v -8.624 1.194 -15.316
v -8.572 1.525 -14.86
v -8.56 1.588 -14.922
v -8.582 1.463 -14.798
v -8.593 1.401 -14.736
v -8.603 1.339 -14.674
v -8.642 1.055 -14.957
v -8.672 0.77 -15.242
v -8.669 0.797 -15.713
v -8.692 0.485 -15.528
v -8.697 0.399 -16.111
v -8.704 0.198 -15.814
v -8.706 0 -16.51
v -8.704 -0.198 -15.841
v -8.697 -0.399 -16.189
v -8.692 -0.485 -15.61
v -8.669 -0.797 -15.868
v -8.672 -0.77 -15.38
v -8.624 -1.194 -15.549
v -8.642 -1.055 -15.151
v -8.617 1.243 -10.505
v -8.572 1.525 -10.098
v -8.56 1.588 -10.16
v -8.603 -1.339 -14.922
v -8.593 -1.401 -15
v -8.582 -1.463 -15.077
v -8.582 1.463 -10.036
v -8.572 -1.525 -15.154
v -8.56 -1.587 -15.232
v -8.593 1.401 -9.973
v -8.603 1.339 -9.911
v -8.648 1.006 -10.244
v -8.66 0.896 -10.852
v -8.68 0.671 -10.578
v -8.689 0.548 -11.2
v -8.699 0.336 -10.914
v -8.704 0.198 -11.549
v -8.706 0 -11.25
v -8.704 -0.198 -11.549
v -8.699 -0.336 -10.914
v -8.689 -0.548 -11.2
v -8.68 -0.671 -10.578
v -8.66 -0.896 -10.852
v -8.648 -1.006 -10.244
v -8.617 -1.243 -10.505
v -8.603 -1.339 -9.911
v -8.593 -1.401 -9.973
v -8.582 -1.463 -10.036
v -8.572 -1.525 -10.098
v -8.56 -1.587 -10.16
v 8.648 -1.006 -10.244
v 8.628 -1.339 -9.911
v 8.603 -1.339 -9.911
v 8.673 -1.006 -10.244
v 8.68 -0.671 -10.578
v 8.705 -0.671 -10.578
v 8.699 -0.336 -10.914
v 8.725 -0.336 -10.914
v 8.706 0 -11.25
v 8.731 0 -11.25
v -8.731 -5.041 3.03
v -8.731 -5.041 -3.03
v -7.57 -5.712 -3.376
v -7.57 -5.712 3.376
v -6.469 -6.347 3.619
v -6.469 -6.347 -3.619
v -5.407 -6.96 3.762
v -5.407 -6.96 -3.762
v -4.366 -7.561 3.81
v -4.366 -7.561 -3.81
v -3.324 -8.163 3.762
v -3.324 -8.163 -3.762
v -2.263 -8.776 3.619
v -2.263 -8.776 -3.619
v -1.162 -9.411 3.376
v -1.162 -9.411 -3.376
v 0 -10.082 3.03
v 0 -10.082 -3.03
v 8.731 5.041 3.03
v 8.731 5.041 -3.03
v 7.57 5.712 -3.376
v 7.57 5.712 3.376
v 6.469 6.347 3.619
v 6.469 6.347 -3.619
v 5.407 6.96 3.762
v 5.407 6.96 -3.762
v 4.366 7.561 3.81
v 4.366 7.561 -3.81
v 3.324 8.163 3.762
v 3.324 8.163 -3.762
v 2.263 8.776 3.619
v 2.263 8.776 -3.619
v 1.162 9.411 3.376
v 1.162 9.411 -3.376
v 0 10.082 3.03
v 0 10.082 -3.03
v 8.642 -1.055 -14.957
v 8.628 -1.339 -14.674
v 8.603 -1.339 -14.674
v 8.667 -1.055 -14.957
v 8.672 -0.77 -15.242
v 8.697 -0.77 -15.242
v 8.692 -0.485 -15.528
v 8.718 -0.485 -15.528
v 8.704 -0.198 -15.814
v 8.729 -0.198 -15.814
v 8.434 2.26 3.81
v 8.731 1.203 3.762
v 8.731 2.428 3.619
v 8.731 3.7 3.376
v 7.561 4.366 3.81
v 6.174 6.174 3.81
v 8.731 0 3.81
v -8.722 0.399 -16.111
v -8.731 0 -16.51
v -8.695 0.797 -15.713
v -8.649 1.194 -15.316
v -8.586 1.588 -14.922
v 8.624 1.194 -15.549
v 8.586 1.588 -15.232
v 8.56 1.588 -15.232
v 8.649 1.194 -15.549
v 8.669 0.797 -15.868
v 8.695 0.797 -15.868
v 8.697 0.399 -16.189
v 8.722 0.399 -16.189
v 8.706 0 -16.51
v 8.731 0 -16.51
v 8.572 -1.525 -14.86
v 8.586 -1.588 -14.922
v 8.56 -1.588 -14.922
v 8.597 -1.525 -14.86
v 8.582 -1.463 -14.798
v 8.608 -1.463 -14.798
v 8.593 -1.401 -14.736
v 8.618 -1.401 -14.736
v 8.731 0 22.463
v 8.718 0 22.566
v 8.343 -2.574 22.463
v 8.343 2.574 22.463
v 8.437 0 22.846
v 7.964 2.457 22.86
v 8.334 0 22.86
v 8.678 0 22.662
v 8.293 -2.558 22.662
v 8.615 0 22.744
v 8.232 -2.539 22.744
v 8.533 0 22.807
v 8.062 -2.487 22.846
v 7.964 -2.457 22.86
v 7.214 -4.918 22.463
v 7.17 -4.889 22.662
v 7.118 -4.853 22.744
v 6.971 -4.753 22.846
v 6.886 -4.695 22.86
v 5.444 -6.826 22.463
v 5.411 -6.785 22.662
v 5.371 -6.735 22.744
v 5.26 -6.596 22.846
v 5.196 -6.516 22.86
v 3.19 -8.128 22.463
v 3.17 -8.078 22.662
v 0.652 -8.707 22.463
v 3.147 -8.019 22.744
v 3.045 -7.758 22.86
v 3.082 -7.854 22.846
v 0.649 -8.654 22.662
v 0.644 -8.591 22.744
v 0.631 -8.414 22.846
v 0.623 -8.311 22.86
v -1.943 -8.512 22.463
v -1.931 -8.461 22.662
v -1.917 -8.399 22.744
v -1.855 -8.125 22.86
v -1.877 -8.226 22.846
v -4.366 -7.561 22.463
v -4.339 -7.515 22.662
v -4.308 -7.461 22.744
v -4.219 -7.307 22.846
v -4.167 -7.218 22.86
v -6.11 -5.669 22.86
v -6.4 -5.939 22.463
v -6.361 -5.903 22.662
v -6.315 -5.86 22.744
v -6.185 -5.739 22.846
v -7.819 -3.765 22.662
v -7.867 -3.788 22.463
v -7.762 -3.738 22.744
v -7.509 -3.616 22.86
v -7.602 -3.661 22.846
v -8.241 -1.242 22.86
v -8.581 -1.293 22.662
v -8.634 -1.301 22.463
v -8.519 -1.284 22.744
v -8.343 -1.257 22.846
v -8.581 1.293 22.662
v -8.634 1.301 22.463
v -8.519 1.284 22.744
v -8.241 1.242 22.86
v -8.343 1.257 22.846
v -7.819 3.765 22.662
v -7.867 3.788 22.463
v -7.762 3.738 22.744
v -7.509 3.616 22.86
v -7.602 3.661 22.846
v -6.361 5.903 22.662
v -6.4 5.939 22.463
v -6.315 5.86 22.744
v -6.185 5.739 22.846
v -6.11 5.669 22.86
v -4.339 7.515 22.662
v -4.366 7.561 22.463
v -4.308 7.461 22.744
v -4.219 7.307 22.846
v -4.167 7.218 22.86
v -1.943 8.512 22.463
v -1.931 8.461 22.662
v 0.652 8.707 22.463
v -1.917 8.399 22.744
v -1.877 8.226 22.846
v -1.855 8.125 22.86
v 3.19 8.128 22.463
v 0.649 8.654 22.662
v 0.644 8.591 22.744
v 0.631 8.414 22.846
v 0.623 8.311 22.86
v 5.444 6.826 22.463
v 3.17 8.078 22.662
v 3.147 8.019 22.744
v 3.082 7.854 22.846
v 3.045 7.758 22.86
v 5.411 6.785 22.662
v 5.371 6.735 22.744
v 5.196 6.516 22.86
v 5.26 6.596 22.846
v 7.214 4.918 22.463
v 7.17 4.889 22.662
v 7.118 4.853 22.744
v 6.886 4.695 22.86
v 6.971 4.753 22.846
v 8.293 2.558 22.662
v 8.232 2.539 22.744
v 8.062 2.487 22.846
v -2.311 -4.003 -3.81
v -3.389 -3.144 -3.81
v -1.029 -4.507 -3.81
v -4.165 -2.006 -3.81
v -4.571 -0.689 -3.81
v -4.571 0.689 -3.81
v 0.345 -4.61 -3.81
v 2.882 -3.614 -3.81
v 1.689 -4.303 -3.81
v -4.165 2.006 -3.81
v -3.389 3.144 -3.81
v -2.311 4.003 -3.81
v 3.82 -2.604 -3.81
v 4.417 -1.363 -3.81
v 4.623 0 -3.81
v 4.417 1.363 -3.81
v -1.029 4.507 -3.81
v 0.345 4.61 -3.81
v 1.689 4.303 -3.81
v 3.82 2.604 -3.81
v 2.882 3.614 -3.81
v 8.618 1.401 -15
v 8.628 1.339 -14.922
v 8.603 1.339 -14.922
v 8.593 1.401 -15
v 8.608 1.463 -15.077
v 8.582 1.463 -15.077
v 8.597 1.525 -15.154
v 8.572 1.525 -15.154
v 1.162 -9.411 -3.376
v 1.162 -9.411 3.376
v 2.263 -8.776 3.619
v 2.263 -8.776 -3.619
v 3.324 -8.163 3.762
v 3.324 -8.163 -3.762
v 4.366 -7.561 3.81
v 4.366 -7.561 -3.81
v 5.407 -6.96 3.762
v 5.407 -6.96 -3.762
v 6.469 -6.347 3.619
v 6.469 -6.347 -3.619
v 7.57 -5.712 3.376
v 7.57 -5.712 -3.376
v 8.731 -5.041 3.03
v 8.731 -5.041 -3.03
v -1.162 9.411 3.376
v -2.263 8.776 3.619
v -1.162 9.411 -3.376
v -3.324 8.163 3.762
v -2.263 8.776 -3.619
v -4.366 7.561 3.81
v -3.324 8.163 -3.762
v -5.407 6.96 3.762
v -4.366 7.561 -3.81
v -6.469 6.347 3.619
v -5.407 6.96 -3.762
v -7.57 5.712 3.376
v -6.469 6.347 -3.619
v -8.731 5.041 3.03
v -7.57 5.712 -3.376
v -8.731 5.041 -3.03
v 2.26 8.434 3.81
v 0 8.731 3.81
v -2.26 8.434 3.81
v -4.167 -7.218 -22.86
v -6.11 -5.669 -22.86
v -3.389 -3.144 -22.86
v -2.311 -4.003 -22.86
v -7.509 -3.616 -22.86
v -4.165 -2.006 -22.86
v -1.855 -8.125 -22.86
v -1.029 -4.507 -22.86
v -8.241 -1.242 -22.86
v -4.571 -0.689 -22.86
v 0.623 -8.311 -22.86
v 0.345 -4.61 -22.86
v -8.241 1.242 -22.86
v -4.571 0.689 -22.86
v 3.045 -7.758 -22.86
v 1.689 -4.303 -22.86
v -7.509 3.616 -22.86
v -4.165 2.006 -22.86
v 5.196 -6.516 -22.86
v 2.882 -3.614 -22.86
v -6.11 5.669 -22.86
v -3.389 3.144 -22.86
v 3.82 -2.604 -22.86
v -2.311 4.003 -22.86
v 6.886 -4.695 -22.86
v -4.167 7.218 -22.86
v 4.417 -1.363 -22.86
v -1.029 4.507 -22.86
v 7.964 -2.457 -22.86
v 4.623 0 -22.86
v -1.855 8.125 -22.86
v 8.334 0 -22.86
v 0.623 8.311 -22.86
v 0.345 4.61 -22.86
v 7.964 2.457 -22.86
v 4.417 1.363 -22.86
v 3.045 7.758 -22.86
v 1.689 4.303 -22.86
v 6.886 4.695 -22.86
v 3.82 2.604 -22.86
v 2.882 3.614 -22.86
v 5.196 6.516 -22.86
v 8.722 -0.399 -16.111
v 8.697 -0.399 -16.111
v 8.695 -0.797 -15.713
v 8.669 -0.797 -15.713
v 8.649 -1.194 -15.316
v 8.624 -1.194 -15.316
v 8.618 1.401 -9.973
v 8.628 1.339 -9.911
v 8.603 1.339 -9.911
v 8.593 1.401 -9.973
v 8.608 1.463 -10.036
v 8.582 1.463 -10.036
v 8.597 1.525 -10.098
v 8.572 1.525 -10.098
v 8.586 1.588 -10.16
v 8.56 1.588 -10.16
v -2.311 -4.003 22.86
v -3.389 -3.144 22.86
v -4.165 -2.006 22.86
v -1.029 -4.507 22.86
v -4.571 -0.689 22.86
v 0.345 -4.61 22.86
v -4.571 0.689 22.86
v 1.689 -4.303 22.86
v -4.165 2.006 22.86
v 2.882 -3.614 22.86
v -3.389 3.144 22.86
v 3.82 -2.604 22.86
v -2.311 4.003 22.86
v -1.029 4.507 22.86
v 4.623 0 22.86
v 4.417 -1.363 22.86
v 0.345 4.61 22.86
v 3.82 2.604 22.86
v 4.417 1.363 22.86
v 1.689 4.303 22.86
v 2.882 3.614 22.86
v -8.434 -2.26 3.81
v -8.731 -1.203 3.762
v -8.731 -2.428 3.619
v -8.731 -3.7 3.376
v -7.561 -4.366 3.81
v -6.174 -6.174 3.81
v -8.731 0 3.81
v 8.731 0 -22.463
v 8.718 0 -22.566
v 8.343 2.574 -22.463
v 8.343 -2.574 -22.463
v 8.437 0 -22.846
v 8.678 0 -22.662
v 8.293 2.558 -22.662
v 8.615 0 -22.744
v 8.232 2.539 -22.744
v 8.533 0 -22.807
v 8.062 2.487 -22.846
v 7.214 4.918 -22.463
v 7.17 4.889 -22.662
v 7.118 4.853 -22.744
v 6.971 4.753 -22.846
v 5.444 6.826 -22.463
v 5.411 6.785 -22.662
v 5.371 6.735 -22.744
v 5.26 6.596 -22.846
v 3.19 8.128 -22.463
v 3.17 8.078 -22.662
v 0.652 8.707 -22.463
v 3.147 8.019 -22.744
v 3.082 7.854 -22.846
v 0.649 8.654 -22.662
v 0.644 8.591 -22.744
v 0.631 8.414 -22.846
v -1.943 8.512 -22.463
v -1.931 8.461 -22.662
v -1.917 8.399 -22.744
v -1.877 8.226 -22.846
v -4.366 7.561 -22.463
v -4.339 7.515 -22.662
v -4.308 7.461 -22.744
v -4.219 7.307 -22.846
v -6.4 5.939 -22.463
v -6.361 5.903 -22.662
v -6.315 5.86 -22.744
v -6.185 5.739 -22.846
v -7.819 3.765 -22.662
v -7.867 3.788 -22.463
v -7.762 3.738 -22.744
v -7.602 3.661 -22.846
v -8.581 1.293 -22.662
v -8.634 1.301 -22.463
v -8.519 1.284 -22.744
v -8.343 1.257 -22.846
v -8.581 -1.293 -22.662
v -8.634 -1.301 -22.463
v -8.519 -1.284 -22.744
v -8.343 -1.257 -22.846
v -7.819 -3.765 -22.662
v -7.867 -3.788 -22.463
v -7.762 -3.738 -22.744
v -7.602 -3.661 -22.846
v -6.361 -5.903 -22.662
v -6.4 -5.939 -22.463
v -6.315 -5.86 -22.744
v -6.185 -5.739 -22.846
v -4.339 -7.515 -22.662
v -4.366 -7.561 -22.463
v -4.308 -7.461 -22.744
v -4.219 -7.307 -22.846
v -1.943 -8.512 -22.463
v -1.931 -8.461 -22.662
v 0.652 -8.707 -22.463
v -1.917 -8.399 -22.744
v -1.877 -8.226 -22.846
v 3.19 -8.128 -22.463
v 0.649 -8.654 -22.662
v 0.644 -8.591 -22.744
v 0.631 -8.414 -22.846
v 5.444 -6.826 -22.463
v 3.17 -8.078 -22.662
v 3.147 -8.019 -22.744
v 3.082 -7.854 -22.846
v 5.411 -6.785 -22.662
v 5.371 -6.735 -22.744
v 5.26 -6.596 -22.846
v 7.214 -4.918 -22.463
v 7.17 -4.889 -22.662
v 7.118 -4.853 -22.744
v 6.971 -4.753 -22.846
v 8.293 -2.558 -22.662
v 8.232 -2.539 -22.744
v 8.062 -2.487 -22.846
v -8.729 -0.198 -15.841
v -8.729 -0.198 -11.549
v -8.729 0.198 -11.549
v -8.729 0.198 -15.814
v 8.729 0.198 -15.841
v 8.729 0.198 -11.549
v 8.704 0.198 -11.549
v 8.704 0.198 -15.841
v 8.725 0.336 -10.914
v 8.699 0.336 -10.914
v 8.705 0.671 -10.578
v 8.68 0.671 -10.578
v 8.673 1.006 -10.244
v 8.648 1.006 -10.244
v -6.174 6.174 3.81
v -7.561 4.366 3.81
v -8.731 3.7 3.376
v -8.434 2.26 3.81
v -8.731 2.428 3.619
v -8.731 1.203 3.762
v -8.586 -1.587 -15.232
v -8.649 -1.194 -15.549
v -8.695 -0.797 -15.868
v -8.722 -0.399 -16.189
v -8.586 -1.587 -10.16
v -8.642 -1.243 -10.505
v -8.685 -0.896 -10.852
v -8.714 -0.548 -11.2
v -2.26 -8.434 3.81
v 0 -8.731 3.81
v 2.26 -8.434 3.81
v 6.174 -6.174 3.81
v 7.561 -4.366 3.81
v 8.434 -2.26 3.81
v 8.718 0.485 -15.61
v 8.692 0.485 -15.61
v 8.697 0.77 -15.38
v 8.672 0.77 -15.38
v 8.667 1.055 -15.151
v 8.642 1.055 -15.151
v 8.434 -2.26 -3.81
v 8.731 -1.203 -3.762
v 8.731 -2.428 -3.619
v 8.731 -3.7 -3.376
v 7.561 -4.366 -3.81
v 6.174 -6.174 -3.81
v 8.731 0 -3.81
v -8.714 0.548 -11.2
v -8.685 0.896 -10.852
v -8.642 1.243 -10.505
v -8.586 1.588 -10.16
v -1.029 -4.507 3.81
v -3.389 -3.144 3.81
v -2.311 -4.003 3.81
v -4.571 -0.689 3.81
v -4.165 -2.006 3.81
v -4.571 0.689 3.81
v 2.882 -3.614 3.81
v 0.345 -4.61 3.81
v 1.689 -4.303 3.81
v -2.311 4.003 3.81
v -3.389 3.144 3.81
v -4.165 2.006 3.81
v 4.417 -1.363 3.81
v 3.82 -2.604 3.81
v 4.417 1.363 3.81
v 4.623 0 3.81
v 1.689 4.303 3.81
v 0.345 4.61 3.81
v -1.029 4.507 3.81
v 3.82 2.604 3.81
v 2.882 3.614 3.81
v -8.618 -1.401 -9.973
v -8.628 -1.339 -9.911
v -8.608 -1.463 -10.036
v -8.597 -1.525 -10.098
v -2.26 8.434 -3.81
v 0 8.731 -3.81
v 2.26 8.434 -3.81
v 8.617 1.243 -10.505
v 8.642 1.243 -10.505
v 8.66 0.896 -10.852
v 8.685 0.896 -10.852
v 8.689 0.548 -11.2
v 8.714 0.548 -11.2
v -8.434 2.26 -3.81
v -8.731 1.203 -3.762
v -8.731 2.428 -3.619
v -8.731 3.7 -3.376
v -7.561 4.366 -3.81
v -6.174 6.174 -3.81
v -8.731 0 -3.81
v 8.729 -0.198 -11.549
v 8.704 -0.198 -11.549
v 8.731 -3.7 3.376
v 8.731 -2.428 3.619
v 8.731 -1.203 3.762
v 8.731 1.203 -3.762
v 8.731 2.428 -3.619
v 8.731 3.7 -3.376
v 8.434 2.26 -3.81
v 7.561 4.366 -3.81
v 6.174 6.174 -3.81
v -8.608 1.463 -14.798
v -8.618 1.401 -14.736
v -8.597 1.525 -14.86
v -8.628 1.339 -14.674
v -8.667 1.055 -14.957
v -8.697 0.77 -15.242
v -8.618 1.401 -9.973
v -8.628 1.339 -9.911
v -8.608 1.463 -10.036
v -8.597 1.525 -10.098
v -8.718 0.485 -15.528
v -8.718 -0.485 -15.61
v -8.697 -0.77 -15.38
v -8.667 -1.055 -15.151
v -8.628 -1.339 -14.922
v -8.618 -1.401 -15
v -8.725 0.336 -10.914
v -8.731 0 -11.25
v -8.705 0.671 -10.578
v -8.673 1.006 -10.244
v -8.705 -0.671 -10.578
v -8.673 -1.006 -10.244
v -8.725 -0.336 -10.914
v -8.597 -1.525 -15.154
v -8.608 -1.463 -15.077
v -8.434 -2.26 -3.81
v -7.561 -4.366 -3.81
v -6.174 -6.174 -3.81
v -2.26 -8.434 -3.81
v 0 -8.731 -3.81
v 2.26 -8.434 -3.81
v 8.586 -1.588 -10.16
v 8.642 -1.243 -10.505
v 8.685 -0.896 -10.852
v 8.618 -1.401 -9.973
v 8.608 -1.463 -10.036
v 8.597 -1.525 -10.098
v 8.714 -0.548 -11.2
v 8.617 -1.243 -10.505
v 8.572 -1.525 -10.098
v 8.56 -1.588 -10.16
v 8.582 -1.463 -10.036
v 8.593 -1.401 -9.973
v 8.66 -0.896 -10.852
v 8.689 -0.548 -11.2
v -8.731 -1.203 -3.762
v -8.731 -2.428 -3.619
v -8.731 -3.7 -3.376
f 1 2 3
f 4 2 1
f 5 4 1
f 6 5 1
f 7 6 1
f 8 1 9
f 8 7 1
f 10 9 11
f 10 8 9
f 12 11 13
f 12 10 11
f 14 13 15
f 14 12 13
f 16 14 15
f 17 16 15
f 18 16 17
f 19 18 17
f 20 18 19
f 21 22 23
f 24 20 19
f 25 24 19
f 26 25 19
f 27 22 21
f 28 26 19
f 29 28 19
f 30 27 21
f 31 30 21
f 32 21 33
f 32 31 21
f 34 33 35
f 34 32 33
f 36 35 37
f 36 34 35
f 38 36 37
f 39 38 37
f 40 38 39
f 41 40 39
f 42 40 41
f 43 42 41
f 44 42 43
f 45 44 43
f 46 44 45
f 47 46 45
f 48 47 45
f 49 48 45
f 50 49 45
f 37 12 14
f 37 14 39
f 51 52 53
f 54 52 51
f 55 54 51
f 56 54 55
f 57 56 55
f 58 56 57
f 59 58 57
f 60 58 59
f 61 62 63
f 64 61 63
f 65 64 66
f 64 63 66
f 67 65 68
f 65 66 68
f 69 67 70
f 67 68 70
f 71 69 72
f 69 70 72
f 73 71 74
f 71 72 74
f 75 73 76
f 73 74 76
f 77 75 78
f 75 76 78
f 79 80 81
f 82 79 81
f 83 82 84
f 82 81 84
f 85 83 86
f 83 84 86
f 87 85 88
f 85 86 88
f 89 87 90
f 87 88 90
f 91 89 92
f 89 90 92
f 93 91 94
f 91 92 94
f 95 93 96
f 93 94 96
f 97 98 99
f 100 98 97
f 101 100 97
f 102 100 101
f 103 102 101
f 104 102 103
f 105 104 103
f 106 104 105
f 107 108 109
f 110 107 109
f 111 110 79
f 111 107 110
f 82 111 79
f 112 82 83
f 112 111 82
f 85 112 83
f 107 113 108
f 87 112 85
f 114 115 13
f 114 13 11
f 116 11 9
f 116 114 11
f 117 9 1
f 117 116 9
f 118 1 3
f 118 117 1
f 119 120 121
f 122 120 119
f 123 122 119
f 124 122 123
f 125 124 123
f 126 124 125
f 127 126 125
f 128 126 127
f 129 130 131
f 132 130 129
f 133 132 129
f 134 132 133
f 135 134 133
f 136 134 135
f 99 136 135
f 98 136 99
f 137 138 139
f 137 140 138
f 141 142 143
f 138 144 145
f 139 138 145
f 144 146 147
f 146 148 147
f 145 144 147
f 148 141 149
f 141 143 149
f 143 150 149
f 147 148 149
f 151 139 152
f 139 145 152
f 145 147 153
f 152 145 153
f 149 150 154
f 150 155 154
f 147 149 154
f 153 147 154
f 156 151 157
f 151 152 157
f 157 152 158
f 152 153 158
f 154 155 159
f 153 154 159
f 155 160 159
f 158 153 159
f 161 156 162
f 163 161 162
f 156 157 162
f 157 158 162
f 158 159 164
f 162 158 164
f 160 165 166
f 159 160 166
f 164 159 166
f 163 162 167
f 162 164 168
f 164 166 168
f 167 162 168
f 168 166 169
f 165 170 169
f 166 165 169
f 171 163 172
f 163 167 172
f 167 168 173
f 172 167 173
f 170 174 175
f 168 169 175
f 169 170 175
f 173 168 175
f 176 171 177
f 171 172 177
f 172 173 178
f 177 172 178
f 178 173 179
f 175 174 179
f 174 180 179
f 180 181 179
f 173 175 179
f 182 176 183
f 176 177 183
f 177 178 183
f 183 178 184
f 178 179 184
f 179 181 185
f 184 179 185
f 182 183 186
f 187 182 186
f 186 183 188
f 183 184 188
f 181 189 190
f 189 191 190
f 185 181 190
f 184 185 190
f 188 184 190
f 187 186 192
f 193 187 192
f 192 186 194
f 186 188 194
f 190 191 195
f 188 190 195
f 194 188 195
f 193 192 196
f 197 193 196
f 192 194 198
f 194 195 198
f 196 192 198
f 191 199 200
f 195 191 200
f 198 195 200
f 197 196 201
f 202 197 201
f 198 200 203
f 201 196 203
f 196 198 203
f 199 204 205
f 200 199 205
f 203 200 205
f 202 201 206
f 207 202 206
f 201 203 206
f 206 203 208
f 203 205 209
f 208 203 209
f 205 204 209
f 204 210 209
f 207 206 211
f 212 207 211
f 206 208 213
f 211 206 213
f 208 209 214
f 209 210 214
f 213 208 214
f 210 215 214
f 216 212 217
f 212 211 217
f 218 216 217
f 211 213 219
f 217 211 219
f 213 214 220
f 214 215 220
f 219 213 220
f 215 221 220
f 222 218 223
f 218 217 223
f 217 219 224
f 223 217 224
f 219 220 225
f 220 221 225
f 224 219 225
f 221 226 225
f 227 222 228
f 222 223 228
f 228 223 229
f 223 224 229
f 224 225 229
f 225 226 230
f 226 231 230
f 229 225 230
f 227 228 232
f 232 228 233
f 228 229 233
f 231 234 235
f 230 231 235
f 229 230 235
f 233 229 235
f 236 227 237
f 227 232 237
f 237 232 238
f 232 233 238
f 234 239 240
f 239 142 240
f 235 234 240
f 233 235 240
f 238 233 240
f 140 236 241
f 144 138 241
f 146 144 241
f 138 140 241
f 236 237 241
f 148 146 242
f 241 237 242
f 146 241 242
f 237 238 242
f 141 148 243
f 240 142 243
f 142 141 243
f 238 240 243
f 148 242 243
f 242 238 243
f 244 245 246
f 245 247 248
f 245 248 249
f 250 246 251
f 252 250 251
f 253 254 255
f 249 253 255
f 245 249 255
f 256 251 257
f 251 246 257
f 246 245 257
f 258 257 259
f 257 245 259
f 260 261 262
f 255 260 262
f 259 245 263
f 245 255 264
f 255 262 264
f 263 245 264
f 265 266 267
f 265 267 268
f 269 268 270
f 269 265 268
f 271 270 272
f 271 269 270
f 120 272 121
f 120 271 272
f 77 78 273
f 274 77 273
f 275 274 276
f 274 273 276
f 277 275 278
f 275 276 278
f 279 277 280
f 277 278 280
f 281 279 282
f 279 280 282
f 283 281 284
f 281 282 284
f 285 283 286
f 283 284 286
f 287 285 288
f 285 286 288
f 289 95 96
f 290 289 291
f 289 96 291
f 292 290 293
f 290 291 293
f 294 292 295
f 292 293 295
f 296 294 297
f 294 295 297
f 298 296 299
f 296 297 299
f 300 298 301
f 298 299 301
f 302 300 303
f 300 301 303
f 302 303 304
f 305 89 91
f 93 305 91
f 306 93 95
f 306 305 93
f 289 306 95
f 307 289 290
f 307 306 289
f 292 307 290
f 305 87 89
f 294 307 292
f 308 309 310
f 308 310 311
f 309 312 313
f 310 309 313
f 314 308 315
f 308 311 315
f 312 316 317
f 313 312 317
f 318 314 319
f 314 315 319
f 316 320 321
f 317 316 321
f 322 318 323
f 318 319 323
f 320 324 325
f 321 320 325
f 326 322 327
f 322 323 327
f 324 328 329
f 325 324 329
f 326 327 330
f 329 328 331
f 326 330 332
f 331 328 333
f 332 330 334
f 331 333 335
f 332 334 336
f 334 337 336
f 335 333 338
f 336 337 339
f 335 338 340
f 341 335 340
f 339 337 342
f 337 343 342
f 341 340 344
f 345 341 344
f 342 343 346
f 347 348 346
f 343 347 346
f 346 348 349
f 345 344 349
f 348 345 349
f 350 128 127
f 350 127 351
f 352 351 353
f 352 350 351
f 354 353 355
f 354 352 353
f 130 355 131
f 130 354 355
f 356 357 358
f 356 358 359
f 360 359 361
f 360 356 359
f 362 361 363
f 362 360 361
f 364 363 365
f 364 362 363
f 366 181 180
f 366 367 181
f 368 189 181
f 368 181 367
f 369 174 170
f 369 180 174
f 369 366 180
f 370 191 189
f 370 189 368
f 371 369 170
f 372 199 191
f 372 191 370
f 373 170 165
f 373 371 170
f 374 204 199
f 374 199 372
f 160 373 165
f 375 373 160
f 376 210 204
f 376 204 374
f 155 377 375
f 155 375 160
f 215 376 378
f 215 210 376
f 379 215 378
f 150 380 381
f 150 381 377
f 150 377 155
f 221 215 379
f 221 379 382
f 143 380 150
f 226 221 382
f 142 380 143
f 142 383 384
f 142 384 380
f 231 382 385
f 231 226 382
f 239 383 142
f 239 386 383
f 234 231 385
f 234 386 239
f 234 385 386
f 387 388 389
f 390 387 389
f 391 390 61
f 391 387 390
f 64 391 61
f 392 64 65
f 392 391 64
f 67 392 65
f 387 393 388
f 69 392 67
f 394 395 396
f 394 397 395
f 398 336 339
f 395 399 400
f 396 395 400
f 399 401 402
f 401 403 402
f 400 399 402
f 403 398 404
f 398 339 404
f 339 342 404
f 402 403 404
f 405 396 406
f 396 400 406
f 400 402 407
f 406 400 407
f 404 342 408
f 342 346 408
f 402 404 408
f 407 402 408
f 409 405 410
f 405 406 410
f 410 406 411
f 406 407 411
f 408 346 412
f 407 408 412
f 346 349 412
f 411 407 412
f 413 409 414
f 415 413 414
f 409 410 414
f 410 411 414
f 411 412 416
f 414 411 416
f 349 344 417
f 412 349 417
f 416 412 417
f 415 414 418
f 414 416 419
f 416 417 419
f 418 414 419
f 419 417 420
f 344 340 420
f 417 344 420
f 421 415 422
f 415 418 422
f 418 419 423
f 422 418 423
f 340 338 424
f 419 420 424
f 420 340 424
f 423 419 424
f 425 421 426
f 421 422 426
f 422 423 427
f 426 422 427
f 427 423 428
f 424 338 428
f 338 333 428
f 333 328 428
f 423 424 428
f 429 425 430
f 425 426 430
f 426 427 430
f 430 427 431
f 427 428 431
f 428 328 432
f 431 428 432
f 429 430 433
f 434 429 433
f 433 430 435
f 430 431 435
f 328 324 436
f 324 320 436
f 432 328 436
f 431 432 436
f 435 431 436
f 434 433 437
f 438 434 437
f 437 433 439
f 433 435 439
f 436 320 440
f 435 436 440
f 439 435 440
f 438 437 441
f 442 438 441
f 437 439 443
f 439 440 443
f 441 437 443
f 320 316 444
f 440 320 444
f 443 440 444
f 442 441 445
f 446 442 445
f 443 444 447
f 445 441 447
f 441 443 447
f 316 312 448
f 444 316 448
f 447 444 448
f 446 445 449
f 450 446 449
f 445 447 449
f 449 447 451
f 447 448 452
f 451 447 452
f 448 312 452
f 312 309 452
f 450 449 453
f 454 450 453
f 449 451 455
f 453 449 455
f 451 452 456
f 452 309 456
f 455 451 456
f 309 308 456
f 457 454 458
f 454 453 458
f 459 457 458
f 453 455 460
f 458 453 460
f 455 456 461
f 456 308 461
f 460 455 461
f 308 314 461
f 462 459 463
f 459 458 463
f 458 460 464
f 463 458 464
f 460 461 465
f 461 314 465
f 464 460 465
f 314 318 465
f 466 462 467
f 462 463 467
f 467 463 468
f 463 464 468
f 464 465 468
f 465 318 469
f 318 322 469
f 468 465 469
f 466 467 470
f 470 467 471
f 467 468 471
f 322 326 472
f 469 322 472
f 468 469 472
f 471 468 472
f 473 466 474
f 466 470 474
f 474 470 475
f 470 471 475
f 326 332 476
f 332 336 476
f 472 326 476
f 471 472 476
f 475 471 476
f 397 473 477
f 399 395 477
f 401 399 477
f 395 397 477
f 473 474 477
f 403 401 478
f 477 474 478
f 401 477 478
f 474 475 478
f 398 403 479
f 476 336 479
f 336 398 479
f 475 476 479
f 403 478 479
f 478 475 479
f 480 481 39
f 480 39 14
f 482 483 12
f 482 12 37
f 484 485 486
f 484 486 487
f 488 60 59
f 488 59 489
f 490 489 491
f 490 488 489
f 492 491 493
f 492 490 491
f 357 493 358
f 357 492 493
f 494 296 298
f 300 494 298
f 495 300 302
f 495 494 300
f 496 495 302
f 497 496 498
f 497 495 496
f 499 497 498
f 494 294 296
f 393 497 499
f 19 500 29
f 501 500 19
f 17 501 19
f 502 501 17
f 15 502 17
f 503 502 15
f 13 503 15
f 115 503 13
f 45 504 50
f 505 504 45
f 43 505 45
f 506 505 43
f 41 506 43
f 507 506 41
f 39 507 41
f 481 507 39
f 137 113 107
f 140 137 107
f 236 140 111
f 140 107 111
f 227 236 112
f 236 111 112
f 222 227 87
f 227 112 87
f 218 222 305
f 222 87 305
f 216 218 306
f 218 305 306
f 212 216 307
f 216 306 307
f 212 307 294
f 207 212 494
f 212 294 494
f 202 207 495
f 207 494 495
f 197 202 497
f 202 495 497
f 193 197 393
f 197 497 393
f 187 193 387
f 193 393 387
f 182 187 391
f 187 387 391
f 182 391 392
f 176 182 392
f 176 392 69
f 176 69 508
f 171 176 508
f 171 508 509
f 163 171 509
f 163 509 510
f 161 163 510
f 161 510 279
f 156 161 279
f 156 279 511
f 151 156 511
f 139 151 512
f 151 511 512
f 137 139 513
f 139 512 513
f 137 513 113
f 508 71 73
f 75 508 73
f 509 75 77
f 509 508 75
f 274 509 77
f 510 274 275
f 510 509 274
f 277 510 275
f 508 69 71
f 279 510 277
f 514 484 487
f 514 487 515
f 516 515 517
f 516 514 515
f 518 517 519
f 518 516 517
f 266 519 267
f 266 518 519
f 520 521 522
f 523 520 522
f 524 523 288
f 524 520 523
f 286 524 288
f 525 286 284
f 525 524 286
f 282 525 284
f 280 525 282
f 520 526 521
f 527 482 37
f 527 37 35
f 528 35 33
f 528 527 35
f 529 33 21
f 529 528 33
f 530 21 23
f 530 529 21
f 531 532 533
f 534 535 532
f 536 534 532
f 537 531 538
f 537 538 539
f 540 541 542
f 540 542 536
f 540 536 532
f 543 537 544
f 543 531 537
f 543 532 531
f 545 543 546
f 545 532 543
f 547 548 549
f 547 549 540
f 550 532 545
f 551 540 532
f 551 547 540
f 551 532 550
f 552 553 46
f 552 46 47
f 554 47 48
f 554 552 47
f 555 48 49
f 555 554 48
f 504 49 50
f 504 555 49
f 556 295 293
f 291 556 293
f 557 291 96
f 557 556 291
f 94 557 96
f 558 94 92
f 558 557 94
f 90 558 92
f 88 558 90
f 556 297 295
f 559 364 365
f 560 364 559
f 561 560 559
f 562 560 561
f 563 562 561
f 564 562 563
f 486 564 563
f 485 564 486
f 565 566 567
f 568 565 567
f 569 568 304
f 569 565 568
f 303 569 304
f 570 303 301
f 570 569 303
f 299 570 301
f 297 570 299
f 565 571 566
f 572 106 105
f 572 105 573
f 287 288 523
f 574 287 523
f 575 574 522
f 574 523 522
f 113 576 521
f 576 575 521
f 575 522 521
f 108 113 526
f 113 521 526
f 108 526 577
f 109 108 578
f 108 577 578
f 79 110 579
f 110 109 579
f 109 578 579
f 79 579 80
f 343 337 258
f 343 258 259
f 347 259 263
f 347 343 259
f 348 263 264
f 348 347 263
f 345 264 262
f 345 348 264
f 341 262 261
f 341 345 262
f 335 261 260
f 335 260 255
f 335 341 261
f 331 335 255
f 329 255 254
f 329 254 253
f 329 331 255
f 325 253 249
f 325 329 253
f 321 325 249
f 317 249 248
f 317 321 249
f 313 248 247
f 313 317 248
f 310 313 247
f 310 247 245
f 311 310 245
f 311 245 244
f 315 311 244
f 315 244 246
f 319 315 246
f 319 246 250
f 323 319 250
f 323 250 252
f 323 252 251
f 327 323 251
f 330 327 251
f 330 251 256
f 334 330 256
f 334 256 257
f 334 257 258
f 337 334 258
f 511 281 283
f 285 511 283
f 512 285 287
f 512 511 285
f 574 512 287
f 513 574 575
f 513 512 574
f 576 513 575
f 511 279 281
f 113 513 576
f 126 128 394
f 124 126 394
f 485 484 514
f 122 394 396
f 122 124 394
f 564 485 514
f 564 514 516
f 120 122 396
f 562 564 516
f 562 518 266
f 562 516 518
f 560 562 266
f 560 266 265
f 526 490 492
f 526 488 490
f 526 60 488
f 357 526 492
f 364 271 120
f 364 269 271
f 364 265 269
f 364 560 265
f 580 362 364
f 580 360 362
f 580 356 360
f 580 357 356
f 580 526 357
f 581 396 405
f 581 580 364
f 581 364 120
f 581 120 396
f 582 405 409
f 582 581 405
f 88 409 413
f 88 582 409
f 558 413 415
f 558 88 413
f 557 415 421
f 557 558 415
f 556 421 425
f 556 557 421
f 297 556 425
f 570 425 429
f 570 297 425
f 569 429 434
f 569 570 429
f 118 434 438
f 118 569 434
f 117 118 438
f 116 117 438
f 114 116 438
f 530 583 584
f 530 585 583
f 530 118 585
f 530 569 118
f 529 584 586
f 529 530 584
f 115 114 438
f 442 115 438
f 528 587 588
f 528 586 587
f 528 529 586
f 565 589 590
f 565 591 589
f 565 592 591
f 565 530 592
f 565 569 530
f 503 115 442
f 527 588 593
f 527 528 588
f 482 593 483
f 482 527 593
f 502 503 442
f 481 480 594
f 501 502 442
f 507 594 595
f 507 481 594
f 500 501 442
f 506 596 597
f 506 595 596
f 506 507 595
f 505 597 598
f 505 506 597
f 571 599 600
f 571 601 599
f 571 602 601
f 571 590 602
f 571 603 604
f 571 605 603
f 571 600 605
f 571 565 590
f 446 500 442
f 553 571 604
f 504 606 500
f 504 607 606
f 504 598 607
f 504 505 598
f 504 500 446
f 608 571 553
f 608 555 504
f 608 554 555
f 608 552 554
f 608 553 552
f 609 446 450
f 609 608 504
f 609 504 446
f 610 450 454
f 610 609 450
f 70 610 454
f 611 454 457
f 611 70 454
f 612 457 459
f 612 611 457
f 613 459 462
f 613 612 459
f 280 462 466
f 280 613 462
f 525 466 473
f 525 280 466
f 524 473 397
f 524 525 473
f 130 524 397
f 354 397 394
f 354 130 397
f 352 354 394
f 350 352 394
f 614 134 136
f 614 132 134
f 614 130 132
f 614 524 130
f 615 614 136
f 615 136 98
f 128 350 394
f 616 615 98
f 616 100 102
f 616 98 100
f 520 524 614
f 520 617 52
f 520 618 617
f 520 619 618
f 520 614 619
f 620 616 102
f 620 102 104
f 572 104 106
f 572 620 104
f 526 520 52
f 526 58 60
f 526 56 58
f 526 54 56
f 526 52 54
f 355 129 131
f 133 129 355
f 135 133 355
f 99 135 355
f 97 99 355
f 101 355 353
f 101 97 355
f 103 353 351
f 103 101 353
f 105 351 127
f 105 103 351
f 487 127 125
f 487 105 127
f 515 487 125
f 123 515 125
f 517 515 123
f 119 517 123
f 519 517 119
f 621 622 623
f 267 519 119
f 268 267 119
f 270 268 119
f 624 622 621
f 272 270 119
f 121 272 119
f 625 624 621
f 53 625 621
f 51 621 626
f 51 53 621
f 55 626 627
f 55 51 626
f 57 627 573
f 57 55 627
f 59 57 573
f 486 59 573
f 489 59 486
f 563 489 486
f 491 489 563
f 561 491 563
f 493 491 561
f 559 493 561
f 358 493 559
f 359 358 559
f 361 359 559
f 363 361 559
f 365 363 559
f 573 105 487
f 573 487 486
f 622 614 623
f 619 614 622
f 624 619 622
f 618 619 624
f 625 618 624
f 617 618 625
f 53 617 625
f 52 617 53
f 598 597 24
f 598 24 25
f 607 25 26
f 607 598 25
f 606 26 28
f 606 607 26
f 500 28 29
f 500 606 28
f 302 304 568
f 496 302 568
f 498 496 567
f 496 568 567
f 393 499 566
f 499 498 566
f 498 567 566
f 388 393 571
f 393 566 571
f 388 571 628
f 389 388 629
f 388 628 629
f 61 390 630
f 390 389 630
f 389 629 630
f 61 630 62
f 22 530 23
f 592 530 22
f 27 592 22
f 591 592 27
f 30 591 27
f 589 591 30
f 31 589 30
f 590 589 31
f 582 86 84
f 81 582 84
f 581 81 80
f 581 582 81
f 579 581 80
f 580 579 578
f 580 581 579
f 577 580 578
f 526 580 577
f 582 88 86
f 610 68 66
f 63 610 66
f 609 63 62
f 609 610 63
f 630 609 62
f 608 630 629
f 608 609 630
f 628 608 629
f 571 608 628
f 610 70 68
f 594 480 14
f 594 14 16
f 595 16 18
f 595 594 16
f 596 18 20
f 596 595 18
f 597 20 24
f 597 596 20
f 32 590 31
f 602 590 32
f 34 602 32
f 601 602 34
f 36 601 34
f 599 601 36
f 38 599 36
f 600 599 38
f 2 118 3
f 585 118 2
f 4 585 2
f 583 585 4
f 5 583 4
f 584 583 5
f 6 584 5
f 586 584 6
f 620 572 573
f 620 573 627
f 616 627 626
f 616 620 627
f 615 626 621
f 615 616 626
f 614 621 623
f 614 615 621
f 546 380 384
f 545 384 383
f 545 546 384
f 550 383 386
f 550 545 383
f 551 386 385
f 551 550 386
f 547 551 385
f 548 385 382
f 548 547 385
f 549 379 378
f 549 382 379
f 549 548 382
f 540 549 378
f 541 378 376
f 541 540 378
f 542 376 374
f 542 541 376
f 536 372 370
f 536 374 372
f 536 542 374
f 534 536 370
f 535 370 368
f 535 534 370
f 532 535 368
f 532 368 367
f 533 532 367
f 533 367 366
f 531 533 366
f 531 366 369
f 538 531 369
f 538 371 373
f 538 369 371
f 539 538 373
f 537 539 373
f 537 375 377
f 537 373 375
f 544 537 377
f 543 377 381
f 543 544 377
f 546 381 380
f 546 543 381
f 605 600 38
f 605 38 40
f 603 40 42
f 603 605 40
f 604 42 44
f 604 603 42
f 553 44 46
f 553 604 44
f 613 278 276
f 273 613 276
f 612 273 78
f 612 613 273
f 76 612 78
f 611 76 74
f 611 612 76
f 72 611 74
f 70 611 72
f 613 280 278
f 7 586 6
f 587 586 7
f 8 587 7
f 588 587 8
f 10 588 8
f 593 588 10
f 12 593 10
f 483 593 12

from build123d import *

# Parameters (mm, degrees)
EXTRUDE1_DEPTH          = 22.86
EXTRUDE1_DEPTH_BACK     = 22.86
EXTRUDE3_0_START        = 3.81
SKETCH3_1_OUTSIDE_W     = 30.048
SKETCH3_1_OUTSIDE_H     = 32.75
SKETCH3_1_OUTSIDE_R     = 8.73125
EXTRUDE3_0_DEPTH        = 19.05
EXTRUDE3_1_START        = -3.81
SKETCH3_1_2_OUTSIDE_W   = 30.048
SKETCH3_1_2_OUTSIDE_H   = 32.75
SKETCH3_1_2_OUTSIDE_R   = 8.73125
EXTRUDE3_1_DEPTH        = 19.05
SKETCH3_2_OUTSIDE_W     = 136.808
SKETCH3_2_OUTSIDE_H     = 139.51
SKETCH3_2_OUTSIDE_R     = 8.73125
EXTRUDE3_2_DEPTH        = 30.818952508
EXTRUDE3_2_DRAFT        = -60
SKETCH3_3_OUTSIDE_W     = 136.808
SKETCH3_3_OUTSIDE_H     = 139.51
SKETCH3_3_OUTSIDE_R     = 8.73125
EXTRUDE3_3_DEPTH        = 30.818952508
EXTRUDE3_3_DRAFT        = -60
FILLET1_R               = 0.396875
EXTRUDE3_4_REACH        = 28.492
EXTRUDE3_4_START_RADIUS = 8.73125
EXTRUDE3_4_END_RADIUS   = 8.73125
CIRPATTERN3_COUNT       = 2
EXTRUDE4_DEPTH          = 27.466216775
EXTRUDE4_DEPTH_BACK     = 27.466216775
SKETCH4_R               = 4.6228
EXTRUDE5_DEPTH          = 3.81
EXTRUDE5_DEPTH_BACK     = 3.81
SKETCH5_R               = 4.6228


with BuildPart() as part:
    # Sketch1.1 → Extrude1 (new, two sides: drawn at the far end of the back side and taken through both)
    with BuildSketch(Plane.XY.offset(-EXTRUDE1_DEPTH_BACK)):
        Polygon((0, 10.081979076), (-8.73125, 5.040989538), (-8.73125, -5.040989538), (0, -10.081979076), (8.73125, -5.040989538), (8.73125, 5.040989538), align=None)
    extrude(amount=EXTRUDE1_DEPTH + EXTRUDE1_DEPTH_BACK)

    # Sketch3.1 outside → Extrude3.0 (cut)
    with BuildSketch(Plane.XY.offset(EXTRUDE3_0_START)):
        Rectangle(SKETCH3_1_OUTSIDE_W, SKETCH3_1_OUTSIDE_H)
        Circle(SKETCH3_1_OUTSIDE_R, mode=Mode.SUBTRACT)
    extrude(amount=EXTRUDE3_0_DEPTH, mode=Mode.SUBTRACT)

    # Sketch3.1<2> outside → Extrude3.1 (cut)
    with BuildSketch(Plane.XY.offset(EXTRUDE3_1_START)):
        Rectangle(SKETCH3_1_2_OUTSIDE_W, SKETCH3_1_2_OUTSIDE_H)
        Circle(SKETCH3_1_2_OUTSIDE_R, mode=Mode.SUBTRACT)
    extrude(amount=-EXTRUDE3_1_DEPTH, mode=Mode.SUBTRACT)


with BuildPart() as extrude3_2_tool:
    # Sketch3.2 outside → Extrude3.2 (with draft: the straight prism first)
    with BuildSketch(Plane.XY.offset(3.81)):
        Rectangle(SKETCH3_2_OUTSIDE_W, SKETCH3_2_OUTSIDE_H)
        Circle(SKETCH3_2_OUTSIDE_R, mode=Mode.SUBTRACT)
    extrude(amount=-EXTRUDE3_2_DEPTH)
    # Extrude3.2: the draft: its side faces are tilted about the plane it starts from
    extrude3_2_sides = [extrude3_2_tool.faces().sort_by_distance(p)[0] for p in [
        (0, -69.755, -11.599476254),
        (68.404, 0, -11.599476254),
        (0, 69.755, -11.599476254),
        (-68.404, 0, -11.599476254),
        (-8.73125, 0, -11.599476254),
    ]]
    draft(extrude3_2_sides, Plane.XY.offset(3.81), EXTRUDE3_2_DRAFT)


with BuildPart() as part_1:
    add(part.part)

    # Extrude3.2: cut by extrude3_2_tool
    add(extrude3_2_tool.part, mode=Mode.SUBTRACT)


with BuildPart() as extrude3_3_tool:
    # Sketch3.3 outside → Extrude3.3 (with draft: the straight prism first)
    with BuildSketch(Plane(origin=(0, 0, -3.81), x_dir=(-1, 0, 0), z_dir=(0, 0, -1))):
        Rectangle(SKETCH3_3_OUTSIDE_W, SKETCH3_3_OUTSIDE_H)
        with Locations(Location((0, 0, 0), (0, 0, 180))):
            Circle(SKETCH3_3_OUTSIDE_R, mode=Mode.SUBTRACT)
    extrude(amount=-EXTRUDE3_3_DEPTH)
    # Extrude3.3: the draft: its side faces are tilted about the plane it starts from
    extrude3_3_sides = [extrude3_3_tool.faces().sort_by_distance(p)[0] for p in [
        (0, -69.755, 11.599476254),
        (-68.404, 0, 11.599476254),
        (0, 69.755, 11.599476254),
        (68.404, 0, 11.599476254),
        (-8.73125, 0, 11.599476254),
    ]]
    draft(extrude3_3_sides, Plane(origin=(0, 0, -3.81), x_dir=(-1, 0, 0), z_dir=(0, 0, -1)), EXTRUDE3_3_DRAFT)


with BuildPart() as part_2:
    add(part_1.part)

    # Extrude3.3: cut by extrude3_3_tool
    add(extrude3_3_tool.part, mode=Mode.SUBTRACT)

    # Fillet1
    fillet1_edges = [part_2.edges().sort_by_distance(p)[0] for p in [
        (-8.73125, 0, 22.86),
        (-8.73125, 0, -22.86),
    ]]
    fillet(fillet1_edges, radius=FILLET1_R)

    # Extrude3.4: from a cylinder face, 28.492 long prism both ways, kept between that surface and its translate by the depth
    extrude3_4_start = Plane(origin=(0, 0, -13.414881), z_dir=(0, 0, 1)) * Cylinder(EXTRUDE3_4_START_RADIUS, 75.4465, mode=Mode.PRIVATE)
    extrude3_4_end = Plane(origin=(-0.0254, 0, -13.414881), z_dir=(0, 0, 1)) * Cylinder(EXTRUDE3_4_END_RADIUS, 75.4465, mode=Mode.PRIVATE)
    # Sketch3.4 → Extrude3.4 (cut, from a surface)
    with BuildSketch(Plane(origin=(0, 0, 0), x_dir=(0, 0, -1), z_dir=(1, 0, 0)), mode=Mode.PRIVATE) as extrude3_4_sk1:
        Polygon((10.16, 1.5875), (11.5490625, 0.1984375), (15.840639961, 0.1984375), (14.9225, 1.338579148), (15.231608679, 1.5875), (16.51, 0), (14.9225, -1.5875), (14.673579148, -1.338579148), (15.813720797, -0.1984375), (11.5490625, -0.1984375), (10.16, -1.5875), (9.911079148, -1.338579148), (11.249658297, 0), (9.911079148, 1.338579148), align=None)
    extrude3_4_tool1 = extrude(extrude3_4_sk1.sketch, amount=EXTRUDE3_4_REACH, both=True, mode=Mode.PRIVATE)
    extrude3_4 = ((extrude3_4_tool1 & extrude3_4_start) - extrude3_4_end).solids().sort_by_distance((8.645784, 0.002778, -13.414881))[0]
    add(extrude3_4, mode=Mode.SUBTRACT)

    # CirPattern3: Extrude3.4 ×2 about axis
    cirpattern3_axis = Axis((0, 0, 0), (0, 0, 1))
    for i in range(1, CIRPATTERN3_COUNT):
        add(extrude3_4.rotate(cirpattern3_axis, i * 360 / CIRPATTERN3_COUNT), mode=Mode.SUBTRACT)

    # Sketch4 → Extrude4 (cut, two sides: drawn at the far end of the back side and taken through both)
    with BuildSketch(Plane.XY.offset(-EXTRUDE4_DEPTH_BACK)):
        Circle(SKETCH4_R)
    extrude(amount=EXTRUDE4_DEPTH + EXTRUDE4_DEPTH_BACK, mode=Mode.SUBTRACT)

    # Sketch5 → Extrude5 (add, two sides: drawn at the far end of the back side and taken through both)
    with BuildSketch(Plane.XY.offset(-EXTRUDE5_DEPTH_BACK)):
        Circle(SKETCH5_R)
    extrude(amount=EXTRUDE5_DEPTH + EXTRUDE5_DEPTH_BACK)


solid = part_2.part
